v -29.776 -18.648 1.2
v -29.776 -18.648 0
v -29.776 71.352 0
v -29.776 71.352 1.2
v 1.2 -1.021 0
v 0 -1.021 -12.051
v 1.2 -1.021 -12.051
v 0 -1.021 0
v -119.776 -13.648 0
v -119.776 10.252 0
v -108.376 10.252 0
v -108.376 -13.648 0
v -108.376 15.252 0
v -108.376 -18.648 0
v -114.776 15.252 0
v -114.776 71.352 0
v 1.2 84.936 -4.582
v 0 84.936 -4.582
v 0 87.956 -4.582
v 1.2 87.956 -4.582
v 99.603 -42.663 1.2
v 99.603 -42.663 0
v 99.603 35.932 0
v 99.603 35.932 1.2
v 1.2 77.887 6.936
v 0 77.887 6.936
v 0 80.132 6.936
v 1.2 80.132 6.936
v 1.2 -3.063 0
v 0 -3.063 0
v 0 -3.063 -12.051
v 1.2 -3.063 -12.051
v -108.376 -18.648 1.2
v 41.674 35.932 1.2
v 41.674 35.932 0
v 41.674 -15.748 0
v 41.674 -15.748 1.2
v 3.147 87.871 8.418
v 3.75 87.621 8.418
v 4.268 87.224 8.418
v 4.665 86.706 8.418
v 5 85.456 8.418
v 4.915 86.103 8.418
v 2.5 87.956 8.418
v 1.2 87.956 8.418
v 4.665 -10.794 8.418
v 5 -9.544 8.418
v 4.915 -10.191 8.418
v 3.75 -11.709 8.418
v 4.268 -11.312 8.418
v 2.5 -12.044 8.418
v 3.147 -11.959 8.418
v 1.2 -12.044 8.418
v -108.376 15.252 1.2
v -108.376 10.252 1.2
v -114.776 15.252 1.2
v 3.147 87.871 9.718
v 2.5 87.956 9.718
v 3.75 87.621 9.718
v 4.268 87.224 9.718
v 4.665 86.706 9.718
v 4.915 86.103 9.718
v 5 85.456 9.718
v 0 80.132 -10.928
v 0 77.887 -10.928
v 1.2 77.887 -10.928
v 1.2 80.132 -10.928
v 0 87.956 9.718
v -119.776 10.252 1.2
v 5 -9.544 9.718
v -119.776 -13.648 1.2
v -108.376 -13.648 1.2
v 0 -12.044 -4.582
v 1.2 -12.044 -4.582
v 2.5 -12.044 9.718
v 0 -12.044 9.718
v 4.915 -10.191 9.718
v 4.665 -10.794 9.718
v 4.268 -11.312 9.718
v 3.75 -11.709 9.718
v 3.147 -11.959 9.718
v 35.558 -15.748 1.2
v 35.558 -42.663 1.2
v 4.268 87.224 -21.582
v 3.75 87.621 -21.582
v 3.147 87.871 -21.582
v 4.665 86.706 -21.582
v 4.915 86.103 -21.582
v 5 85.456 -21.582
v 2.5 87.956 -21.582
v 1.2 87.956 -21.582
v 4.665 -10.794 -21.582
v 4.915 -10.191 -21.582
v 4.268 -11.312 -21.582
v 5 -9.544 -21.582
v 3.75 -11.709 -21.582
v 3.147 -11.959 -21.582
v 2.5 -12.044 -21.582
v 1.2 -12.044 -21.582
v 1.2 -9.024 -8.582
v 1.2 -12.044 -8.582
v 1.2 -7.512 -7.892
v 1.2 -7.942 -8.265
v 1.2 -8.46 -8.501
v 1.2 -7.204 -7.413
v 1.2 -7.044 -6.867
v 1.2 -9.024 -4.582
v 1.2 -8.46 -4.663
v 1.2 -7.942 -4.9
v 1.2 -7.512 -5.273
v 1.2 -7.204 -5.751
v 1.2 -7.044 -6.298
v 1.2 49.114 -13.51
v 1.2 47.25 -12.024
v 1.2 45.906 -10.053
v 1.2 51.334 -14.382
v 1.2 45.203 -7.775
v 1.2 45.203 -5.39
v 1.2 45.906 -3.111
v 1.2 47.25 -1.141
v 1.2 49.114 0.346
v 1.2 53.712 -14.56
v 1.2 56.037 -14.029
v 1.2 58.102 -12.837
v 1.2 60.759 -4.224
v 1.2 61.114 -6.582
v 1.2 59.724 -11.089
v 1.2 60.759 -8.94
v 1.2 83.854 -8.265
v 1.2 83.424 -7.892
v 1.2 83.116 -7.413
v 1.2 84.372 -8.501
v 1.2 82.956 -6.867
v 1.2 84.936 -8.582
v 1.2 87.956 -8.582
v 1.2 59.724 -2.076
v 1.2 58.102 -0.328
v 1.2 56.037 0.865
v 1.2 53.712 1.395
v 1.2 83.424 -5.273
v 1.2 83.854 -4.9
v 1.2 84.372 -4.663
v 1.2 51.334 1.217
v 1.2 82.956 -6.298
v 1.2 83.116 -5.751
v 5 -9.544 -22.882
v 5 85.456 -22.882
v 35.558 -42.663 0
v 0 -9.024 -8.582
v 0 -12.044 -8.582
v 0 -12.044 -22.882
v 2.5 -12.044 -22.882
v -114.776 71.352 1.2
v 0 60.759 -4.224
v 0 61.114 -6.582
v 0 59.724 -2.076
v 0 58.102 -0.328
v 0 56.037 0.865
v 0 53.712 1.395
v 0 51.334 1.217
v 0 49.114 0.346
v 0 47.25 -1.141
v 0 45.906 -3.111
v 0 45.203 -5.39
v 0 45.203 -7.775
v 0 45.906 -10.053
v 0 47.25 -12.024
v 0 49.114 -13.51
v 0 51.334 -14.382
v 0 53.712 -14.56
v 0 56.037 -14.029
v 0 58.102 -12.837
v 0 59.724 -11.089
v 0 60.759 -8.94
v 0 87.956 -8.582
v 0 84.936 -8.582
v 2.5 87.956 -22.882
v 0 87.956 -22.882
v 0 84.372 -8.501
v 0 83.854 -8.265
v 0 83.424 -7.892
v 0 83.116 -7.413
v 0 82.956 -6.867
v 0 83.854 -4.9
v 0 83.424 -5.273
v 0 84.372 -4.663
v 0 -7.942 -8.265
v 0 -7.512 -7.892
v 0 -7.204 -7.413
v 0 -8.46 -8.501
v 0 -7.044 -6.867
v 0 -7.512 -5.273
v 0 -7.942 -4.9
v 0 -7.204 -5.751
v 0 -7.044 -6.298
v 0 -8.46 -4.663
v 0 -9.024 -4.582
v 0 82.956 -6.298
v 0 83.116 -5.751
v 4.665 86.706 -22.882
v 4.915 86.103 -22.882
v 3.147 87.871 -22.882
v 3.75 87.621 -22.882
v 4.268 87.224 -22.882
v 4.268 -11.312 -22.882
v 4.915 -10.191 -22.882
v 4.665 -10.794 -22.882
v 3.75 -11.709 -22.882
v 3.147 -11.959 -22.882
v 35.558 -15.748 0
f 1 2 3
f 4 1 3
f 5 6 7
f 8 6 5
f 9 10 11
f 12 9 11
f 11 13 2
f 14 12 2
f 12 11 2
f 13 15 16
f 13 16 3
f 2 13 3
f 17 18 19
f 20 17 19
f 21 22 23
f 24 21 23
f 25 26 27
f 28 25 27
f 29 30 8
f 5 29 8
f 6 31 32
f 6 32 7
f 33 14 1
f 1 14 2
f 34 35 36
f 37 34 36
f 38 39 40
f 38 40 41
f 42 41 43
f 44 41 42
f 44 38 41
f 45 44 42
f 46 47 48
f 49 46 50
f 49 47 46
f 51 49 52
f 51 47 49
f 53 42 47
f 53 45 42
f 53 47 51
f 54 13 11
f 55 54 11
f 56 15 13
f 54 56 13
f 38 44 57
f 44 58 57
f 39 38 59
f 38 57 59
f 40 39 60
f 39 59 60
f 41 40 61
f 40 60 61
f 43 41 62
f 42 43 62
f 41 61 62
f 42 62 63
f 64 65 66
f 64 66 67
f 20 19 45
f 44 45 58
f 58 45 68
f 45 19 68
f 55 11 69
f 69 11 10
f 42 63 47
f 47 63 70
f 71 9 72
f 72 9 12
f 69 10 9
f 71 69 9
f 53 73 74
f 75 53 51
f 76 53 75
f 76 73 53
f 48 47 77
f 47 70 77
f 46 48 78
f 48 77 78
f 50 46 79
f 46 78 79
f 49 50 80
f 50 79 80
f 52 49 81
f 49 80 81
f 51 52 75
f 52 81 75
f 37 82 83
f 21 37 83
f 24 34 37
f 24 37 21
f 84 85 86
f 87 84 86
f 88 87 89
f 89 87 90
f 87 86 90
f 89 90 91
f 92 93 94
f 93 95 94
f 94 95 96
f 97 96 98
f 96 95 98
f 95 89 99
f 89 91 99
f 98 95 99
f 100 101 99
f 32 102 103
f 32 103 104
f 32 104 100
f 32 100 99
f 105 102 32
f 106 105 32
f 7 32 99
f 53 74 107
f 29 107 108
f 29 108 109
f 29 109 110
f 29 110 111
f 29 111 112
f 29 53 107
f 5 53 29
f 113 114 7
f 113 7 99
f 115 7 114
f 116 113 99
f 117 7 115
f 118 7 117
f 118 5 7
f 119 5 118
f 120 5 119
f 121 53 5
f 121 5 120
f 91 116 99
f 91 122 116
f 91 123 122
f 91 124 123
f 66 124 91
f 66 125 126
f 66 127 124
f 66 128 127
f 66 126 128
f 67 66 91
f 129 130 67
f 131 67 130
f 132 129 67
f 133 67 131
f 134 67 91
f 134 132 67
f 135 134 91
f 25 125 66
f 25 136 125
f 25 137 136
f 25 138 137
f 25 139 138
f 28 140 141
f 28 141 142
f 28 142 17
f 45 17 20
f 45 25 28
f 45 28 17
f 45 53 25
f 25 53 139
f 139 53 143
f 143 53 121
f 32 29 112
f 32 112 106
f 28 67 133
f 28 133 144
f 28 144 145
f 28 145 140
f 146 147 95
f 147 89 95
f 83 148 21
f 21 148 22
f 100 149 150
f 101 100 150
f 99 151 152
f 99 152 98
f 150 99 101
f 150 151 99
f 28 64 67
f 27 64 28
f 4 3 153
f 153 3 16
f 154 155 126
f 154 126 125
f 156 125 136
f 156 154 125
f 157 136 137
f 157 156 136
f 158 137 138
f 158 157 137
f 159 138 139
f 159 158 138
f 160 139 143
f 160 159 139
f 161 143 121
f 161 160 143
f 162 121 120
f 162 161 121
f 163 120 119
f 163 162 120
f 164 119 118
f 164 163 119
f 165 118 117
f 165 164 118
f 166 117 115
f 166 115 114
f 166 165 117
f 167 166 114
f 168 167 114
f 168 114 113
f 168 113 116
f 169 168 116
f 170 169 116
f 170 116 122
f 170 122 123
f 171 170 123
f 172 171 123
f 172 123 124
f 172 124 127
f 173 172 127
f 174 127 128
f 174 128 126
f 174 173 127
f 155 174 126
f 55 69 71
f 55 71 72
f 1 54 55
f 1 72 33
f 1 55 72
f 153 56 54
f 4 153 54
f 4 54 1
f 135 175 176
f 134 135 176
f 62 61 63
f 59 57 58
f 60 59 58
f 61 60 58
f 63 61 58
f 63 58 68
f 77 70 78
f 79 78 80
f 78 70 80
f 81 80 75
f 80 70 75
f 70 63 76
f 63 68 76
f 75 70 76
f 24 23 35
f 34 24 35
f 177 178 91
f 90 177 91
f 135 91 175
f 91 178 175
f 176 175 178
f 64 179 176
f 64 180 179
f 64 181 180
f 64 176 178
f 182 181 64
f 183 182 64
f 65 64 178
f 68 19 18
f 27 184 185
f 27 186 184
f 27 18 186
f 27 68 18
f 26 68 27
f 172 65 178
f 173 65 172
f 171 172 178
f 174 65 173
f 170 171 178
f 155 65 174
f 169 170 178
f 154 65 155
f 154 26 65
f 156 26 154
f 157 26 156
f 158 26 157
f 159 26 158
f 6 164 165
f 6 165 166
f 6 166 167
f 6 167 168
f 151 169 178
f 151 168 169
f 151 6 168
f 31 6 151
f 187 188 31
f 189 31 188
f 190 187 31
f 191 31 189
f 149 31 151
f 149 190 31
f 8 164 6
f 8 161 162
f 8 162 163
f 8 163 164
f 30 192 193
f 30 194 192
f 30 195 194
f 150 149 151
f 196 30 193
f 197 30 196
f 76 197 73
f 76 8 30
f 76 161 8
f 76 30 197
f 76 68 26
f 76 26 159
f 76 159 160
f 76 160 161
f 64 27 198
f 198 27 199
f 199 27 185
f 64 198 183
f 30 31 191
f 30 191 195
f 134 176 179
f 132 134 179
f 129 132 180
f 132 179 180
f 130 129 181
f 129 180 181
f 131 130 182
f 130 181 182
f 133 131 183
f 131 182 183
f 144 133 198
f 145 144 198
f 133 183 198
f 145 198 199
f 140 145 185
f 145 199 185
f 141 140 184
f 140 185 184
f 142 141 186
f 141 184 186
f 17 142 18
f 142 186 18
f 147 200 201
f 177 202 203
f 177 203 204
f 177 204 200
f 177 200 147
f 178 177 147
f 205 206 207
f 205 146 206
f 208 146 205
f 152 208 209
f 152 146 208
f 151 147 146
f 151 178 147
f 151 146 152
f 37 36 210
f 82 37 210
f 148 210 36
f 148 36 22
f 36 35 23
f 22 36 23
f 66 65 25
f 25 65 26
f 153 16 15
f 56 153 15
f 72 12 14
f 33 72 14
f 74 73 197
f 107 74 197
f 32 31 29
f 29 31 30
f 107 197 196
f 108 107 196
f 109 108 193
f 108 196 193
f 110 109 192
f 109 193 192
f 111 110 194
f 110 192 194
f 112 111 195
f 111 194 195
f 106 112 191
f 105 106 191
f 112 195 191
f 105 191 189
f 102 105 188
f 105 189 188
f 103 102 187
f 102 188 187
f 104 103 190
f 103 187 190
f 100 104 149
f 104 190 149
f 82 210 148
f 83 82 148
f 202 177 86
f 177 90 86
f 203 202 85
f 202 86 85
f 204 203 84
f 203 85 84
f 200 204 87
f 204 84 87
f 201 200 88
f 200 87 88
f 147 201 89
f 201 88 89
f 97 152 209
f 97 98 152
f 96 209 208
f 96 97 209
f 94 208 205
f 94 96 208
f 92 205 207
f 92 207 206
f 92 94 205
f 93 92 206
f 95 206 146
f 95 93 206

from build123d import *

# Parameters (mm, degrees)
F0_W     = 2.041602
F0_H     = 12.050721
F0_R     = 8
F0_W_2   = 2.245762
F0_H_2   = 17.864013
F1_DEPTH = 1.2
F2_W     = 100
F2_H     = 1.3
F3_DEPTH = 5
F4_W     = 100
F4_H     = 1.3
F5_DEPTH = 5
F6_R     = 2.5
F9_DEPTH = 1.2


with BuildPart() as f1:
    # F0 (on Right) → F1 (new body)
    with BuildSketch(Plane.YZ):
        with BuildLine():
            Line((87.956028, 8.417723), (-12.043972, 8.417723))
            Line((-12.043972, 8.417723), (-12.043972, -4.582277))
            Line((-12.043972, -4.582277), (-9.023586, -4.582277))
            ThreePointArc((-9.023586, -4.582277), (-7.023586, -6.582277), (-9.023586, -8.582277))
            Line((-9.023586, -8.582277), (-12.043972, -8.582277))
            Line((-12.043972, -8.582277), (-12.043972, -21.582277))
            Line((-12.043972, -21.582277), (87.956028, -21.582277))
            Line((87.956028, -21.582277), (87.956028, -8.582277))
            Line((87.956028, -8.582277), (84.935643, -8.582277))
            ThreePointArc((84.935643, -8.582277), (82.935643, -6.582277), (84.935643, -4.582277))
            Line((84.935643, -4.582277), (87.956028, -4.582277))
            Line((87.956028, -4.582277), (87.956028, 8.417723))
        make_face()
        with Locations((-2.042036, -6.02536)):
            Rectangle(F0_W, F0_H, mode=Mode.SUBTRACT)
        with Locations((53.114146, -6.582277)):
            Circle(F0_R, mode=Mode.SUBTRACT)
        with Locations((79.009544, -1.995832)):
            Rectangle(F0_W_2, F0_H_2, mode=Mode.SUBTRACT)
    extrude(amount=F1_DEPTH)

    # F2 (on face) → F3 (join)
    with BuildSketch(Plane(origin=(0, 0, 0), x_dir=(0, -1, 0), z_dir=(-1, 0, 0))):
        with Locations((-37.956028, 9.067723)):
            Rectangle(F2_W, F2_H)
    extrude(amount=-F3_DEPTH)

    # F4 (on face) → F5 (join)
    with BuildSketch(Plane(origin=(0, 0, 0), x_dir=(0, -1, 0), z_dir=(-1, 0, 0))):
        with Locations((-37.956028, -22.232277)):
            Rectangle(F4_W, F4_H)
    extrude(amount=-F5_DEPTH)

    # F6
    f6_edges = [f1.edges().sort_by_distance(p)[0] for p in [
        (5, -12.043972, 9.067723),
        (5, 87.956028, 9.067723),
        (5, 87.956028, -22.232277),
        (5, -12.043972, -22.232277),
    ]]
    fillet(f6_edges, radius=F6_R)


with BuildPart() as f9:
    # F7 (on Top) + F8 (on Top) → F9 (new body)
    with BuildSketch(Plane.XY):
        Polygon((-29.776221, 71.351834), (-114.776224, 71.351834), (-114.776224, 15.251834), (-108.376227, 15.251834), (-108.376227, 10.251834), (-119.776221, 10.251834), (-119.776221, -13.648166), (-108.376227, -13.648166), (-108.376227, -18.648166), (-29.776221, -18.648166), align=None)
    with BuildSketch(Plane.XY):
        Polygon((35.558051, -15.748166), (35.558051, -42.662875), (99.603191, -42.662875), (99.603191, 35.932115), (41.673616, 35.932115), (41.673616, -15.748166), align=None)
    extrude(amount=F9_DEPTH)


solid = Compound([f1.part, f9.part])
